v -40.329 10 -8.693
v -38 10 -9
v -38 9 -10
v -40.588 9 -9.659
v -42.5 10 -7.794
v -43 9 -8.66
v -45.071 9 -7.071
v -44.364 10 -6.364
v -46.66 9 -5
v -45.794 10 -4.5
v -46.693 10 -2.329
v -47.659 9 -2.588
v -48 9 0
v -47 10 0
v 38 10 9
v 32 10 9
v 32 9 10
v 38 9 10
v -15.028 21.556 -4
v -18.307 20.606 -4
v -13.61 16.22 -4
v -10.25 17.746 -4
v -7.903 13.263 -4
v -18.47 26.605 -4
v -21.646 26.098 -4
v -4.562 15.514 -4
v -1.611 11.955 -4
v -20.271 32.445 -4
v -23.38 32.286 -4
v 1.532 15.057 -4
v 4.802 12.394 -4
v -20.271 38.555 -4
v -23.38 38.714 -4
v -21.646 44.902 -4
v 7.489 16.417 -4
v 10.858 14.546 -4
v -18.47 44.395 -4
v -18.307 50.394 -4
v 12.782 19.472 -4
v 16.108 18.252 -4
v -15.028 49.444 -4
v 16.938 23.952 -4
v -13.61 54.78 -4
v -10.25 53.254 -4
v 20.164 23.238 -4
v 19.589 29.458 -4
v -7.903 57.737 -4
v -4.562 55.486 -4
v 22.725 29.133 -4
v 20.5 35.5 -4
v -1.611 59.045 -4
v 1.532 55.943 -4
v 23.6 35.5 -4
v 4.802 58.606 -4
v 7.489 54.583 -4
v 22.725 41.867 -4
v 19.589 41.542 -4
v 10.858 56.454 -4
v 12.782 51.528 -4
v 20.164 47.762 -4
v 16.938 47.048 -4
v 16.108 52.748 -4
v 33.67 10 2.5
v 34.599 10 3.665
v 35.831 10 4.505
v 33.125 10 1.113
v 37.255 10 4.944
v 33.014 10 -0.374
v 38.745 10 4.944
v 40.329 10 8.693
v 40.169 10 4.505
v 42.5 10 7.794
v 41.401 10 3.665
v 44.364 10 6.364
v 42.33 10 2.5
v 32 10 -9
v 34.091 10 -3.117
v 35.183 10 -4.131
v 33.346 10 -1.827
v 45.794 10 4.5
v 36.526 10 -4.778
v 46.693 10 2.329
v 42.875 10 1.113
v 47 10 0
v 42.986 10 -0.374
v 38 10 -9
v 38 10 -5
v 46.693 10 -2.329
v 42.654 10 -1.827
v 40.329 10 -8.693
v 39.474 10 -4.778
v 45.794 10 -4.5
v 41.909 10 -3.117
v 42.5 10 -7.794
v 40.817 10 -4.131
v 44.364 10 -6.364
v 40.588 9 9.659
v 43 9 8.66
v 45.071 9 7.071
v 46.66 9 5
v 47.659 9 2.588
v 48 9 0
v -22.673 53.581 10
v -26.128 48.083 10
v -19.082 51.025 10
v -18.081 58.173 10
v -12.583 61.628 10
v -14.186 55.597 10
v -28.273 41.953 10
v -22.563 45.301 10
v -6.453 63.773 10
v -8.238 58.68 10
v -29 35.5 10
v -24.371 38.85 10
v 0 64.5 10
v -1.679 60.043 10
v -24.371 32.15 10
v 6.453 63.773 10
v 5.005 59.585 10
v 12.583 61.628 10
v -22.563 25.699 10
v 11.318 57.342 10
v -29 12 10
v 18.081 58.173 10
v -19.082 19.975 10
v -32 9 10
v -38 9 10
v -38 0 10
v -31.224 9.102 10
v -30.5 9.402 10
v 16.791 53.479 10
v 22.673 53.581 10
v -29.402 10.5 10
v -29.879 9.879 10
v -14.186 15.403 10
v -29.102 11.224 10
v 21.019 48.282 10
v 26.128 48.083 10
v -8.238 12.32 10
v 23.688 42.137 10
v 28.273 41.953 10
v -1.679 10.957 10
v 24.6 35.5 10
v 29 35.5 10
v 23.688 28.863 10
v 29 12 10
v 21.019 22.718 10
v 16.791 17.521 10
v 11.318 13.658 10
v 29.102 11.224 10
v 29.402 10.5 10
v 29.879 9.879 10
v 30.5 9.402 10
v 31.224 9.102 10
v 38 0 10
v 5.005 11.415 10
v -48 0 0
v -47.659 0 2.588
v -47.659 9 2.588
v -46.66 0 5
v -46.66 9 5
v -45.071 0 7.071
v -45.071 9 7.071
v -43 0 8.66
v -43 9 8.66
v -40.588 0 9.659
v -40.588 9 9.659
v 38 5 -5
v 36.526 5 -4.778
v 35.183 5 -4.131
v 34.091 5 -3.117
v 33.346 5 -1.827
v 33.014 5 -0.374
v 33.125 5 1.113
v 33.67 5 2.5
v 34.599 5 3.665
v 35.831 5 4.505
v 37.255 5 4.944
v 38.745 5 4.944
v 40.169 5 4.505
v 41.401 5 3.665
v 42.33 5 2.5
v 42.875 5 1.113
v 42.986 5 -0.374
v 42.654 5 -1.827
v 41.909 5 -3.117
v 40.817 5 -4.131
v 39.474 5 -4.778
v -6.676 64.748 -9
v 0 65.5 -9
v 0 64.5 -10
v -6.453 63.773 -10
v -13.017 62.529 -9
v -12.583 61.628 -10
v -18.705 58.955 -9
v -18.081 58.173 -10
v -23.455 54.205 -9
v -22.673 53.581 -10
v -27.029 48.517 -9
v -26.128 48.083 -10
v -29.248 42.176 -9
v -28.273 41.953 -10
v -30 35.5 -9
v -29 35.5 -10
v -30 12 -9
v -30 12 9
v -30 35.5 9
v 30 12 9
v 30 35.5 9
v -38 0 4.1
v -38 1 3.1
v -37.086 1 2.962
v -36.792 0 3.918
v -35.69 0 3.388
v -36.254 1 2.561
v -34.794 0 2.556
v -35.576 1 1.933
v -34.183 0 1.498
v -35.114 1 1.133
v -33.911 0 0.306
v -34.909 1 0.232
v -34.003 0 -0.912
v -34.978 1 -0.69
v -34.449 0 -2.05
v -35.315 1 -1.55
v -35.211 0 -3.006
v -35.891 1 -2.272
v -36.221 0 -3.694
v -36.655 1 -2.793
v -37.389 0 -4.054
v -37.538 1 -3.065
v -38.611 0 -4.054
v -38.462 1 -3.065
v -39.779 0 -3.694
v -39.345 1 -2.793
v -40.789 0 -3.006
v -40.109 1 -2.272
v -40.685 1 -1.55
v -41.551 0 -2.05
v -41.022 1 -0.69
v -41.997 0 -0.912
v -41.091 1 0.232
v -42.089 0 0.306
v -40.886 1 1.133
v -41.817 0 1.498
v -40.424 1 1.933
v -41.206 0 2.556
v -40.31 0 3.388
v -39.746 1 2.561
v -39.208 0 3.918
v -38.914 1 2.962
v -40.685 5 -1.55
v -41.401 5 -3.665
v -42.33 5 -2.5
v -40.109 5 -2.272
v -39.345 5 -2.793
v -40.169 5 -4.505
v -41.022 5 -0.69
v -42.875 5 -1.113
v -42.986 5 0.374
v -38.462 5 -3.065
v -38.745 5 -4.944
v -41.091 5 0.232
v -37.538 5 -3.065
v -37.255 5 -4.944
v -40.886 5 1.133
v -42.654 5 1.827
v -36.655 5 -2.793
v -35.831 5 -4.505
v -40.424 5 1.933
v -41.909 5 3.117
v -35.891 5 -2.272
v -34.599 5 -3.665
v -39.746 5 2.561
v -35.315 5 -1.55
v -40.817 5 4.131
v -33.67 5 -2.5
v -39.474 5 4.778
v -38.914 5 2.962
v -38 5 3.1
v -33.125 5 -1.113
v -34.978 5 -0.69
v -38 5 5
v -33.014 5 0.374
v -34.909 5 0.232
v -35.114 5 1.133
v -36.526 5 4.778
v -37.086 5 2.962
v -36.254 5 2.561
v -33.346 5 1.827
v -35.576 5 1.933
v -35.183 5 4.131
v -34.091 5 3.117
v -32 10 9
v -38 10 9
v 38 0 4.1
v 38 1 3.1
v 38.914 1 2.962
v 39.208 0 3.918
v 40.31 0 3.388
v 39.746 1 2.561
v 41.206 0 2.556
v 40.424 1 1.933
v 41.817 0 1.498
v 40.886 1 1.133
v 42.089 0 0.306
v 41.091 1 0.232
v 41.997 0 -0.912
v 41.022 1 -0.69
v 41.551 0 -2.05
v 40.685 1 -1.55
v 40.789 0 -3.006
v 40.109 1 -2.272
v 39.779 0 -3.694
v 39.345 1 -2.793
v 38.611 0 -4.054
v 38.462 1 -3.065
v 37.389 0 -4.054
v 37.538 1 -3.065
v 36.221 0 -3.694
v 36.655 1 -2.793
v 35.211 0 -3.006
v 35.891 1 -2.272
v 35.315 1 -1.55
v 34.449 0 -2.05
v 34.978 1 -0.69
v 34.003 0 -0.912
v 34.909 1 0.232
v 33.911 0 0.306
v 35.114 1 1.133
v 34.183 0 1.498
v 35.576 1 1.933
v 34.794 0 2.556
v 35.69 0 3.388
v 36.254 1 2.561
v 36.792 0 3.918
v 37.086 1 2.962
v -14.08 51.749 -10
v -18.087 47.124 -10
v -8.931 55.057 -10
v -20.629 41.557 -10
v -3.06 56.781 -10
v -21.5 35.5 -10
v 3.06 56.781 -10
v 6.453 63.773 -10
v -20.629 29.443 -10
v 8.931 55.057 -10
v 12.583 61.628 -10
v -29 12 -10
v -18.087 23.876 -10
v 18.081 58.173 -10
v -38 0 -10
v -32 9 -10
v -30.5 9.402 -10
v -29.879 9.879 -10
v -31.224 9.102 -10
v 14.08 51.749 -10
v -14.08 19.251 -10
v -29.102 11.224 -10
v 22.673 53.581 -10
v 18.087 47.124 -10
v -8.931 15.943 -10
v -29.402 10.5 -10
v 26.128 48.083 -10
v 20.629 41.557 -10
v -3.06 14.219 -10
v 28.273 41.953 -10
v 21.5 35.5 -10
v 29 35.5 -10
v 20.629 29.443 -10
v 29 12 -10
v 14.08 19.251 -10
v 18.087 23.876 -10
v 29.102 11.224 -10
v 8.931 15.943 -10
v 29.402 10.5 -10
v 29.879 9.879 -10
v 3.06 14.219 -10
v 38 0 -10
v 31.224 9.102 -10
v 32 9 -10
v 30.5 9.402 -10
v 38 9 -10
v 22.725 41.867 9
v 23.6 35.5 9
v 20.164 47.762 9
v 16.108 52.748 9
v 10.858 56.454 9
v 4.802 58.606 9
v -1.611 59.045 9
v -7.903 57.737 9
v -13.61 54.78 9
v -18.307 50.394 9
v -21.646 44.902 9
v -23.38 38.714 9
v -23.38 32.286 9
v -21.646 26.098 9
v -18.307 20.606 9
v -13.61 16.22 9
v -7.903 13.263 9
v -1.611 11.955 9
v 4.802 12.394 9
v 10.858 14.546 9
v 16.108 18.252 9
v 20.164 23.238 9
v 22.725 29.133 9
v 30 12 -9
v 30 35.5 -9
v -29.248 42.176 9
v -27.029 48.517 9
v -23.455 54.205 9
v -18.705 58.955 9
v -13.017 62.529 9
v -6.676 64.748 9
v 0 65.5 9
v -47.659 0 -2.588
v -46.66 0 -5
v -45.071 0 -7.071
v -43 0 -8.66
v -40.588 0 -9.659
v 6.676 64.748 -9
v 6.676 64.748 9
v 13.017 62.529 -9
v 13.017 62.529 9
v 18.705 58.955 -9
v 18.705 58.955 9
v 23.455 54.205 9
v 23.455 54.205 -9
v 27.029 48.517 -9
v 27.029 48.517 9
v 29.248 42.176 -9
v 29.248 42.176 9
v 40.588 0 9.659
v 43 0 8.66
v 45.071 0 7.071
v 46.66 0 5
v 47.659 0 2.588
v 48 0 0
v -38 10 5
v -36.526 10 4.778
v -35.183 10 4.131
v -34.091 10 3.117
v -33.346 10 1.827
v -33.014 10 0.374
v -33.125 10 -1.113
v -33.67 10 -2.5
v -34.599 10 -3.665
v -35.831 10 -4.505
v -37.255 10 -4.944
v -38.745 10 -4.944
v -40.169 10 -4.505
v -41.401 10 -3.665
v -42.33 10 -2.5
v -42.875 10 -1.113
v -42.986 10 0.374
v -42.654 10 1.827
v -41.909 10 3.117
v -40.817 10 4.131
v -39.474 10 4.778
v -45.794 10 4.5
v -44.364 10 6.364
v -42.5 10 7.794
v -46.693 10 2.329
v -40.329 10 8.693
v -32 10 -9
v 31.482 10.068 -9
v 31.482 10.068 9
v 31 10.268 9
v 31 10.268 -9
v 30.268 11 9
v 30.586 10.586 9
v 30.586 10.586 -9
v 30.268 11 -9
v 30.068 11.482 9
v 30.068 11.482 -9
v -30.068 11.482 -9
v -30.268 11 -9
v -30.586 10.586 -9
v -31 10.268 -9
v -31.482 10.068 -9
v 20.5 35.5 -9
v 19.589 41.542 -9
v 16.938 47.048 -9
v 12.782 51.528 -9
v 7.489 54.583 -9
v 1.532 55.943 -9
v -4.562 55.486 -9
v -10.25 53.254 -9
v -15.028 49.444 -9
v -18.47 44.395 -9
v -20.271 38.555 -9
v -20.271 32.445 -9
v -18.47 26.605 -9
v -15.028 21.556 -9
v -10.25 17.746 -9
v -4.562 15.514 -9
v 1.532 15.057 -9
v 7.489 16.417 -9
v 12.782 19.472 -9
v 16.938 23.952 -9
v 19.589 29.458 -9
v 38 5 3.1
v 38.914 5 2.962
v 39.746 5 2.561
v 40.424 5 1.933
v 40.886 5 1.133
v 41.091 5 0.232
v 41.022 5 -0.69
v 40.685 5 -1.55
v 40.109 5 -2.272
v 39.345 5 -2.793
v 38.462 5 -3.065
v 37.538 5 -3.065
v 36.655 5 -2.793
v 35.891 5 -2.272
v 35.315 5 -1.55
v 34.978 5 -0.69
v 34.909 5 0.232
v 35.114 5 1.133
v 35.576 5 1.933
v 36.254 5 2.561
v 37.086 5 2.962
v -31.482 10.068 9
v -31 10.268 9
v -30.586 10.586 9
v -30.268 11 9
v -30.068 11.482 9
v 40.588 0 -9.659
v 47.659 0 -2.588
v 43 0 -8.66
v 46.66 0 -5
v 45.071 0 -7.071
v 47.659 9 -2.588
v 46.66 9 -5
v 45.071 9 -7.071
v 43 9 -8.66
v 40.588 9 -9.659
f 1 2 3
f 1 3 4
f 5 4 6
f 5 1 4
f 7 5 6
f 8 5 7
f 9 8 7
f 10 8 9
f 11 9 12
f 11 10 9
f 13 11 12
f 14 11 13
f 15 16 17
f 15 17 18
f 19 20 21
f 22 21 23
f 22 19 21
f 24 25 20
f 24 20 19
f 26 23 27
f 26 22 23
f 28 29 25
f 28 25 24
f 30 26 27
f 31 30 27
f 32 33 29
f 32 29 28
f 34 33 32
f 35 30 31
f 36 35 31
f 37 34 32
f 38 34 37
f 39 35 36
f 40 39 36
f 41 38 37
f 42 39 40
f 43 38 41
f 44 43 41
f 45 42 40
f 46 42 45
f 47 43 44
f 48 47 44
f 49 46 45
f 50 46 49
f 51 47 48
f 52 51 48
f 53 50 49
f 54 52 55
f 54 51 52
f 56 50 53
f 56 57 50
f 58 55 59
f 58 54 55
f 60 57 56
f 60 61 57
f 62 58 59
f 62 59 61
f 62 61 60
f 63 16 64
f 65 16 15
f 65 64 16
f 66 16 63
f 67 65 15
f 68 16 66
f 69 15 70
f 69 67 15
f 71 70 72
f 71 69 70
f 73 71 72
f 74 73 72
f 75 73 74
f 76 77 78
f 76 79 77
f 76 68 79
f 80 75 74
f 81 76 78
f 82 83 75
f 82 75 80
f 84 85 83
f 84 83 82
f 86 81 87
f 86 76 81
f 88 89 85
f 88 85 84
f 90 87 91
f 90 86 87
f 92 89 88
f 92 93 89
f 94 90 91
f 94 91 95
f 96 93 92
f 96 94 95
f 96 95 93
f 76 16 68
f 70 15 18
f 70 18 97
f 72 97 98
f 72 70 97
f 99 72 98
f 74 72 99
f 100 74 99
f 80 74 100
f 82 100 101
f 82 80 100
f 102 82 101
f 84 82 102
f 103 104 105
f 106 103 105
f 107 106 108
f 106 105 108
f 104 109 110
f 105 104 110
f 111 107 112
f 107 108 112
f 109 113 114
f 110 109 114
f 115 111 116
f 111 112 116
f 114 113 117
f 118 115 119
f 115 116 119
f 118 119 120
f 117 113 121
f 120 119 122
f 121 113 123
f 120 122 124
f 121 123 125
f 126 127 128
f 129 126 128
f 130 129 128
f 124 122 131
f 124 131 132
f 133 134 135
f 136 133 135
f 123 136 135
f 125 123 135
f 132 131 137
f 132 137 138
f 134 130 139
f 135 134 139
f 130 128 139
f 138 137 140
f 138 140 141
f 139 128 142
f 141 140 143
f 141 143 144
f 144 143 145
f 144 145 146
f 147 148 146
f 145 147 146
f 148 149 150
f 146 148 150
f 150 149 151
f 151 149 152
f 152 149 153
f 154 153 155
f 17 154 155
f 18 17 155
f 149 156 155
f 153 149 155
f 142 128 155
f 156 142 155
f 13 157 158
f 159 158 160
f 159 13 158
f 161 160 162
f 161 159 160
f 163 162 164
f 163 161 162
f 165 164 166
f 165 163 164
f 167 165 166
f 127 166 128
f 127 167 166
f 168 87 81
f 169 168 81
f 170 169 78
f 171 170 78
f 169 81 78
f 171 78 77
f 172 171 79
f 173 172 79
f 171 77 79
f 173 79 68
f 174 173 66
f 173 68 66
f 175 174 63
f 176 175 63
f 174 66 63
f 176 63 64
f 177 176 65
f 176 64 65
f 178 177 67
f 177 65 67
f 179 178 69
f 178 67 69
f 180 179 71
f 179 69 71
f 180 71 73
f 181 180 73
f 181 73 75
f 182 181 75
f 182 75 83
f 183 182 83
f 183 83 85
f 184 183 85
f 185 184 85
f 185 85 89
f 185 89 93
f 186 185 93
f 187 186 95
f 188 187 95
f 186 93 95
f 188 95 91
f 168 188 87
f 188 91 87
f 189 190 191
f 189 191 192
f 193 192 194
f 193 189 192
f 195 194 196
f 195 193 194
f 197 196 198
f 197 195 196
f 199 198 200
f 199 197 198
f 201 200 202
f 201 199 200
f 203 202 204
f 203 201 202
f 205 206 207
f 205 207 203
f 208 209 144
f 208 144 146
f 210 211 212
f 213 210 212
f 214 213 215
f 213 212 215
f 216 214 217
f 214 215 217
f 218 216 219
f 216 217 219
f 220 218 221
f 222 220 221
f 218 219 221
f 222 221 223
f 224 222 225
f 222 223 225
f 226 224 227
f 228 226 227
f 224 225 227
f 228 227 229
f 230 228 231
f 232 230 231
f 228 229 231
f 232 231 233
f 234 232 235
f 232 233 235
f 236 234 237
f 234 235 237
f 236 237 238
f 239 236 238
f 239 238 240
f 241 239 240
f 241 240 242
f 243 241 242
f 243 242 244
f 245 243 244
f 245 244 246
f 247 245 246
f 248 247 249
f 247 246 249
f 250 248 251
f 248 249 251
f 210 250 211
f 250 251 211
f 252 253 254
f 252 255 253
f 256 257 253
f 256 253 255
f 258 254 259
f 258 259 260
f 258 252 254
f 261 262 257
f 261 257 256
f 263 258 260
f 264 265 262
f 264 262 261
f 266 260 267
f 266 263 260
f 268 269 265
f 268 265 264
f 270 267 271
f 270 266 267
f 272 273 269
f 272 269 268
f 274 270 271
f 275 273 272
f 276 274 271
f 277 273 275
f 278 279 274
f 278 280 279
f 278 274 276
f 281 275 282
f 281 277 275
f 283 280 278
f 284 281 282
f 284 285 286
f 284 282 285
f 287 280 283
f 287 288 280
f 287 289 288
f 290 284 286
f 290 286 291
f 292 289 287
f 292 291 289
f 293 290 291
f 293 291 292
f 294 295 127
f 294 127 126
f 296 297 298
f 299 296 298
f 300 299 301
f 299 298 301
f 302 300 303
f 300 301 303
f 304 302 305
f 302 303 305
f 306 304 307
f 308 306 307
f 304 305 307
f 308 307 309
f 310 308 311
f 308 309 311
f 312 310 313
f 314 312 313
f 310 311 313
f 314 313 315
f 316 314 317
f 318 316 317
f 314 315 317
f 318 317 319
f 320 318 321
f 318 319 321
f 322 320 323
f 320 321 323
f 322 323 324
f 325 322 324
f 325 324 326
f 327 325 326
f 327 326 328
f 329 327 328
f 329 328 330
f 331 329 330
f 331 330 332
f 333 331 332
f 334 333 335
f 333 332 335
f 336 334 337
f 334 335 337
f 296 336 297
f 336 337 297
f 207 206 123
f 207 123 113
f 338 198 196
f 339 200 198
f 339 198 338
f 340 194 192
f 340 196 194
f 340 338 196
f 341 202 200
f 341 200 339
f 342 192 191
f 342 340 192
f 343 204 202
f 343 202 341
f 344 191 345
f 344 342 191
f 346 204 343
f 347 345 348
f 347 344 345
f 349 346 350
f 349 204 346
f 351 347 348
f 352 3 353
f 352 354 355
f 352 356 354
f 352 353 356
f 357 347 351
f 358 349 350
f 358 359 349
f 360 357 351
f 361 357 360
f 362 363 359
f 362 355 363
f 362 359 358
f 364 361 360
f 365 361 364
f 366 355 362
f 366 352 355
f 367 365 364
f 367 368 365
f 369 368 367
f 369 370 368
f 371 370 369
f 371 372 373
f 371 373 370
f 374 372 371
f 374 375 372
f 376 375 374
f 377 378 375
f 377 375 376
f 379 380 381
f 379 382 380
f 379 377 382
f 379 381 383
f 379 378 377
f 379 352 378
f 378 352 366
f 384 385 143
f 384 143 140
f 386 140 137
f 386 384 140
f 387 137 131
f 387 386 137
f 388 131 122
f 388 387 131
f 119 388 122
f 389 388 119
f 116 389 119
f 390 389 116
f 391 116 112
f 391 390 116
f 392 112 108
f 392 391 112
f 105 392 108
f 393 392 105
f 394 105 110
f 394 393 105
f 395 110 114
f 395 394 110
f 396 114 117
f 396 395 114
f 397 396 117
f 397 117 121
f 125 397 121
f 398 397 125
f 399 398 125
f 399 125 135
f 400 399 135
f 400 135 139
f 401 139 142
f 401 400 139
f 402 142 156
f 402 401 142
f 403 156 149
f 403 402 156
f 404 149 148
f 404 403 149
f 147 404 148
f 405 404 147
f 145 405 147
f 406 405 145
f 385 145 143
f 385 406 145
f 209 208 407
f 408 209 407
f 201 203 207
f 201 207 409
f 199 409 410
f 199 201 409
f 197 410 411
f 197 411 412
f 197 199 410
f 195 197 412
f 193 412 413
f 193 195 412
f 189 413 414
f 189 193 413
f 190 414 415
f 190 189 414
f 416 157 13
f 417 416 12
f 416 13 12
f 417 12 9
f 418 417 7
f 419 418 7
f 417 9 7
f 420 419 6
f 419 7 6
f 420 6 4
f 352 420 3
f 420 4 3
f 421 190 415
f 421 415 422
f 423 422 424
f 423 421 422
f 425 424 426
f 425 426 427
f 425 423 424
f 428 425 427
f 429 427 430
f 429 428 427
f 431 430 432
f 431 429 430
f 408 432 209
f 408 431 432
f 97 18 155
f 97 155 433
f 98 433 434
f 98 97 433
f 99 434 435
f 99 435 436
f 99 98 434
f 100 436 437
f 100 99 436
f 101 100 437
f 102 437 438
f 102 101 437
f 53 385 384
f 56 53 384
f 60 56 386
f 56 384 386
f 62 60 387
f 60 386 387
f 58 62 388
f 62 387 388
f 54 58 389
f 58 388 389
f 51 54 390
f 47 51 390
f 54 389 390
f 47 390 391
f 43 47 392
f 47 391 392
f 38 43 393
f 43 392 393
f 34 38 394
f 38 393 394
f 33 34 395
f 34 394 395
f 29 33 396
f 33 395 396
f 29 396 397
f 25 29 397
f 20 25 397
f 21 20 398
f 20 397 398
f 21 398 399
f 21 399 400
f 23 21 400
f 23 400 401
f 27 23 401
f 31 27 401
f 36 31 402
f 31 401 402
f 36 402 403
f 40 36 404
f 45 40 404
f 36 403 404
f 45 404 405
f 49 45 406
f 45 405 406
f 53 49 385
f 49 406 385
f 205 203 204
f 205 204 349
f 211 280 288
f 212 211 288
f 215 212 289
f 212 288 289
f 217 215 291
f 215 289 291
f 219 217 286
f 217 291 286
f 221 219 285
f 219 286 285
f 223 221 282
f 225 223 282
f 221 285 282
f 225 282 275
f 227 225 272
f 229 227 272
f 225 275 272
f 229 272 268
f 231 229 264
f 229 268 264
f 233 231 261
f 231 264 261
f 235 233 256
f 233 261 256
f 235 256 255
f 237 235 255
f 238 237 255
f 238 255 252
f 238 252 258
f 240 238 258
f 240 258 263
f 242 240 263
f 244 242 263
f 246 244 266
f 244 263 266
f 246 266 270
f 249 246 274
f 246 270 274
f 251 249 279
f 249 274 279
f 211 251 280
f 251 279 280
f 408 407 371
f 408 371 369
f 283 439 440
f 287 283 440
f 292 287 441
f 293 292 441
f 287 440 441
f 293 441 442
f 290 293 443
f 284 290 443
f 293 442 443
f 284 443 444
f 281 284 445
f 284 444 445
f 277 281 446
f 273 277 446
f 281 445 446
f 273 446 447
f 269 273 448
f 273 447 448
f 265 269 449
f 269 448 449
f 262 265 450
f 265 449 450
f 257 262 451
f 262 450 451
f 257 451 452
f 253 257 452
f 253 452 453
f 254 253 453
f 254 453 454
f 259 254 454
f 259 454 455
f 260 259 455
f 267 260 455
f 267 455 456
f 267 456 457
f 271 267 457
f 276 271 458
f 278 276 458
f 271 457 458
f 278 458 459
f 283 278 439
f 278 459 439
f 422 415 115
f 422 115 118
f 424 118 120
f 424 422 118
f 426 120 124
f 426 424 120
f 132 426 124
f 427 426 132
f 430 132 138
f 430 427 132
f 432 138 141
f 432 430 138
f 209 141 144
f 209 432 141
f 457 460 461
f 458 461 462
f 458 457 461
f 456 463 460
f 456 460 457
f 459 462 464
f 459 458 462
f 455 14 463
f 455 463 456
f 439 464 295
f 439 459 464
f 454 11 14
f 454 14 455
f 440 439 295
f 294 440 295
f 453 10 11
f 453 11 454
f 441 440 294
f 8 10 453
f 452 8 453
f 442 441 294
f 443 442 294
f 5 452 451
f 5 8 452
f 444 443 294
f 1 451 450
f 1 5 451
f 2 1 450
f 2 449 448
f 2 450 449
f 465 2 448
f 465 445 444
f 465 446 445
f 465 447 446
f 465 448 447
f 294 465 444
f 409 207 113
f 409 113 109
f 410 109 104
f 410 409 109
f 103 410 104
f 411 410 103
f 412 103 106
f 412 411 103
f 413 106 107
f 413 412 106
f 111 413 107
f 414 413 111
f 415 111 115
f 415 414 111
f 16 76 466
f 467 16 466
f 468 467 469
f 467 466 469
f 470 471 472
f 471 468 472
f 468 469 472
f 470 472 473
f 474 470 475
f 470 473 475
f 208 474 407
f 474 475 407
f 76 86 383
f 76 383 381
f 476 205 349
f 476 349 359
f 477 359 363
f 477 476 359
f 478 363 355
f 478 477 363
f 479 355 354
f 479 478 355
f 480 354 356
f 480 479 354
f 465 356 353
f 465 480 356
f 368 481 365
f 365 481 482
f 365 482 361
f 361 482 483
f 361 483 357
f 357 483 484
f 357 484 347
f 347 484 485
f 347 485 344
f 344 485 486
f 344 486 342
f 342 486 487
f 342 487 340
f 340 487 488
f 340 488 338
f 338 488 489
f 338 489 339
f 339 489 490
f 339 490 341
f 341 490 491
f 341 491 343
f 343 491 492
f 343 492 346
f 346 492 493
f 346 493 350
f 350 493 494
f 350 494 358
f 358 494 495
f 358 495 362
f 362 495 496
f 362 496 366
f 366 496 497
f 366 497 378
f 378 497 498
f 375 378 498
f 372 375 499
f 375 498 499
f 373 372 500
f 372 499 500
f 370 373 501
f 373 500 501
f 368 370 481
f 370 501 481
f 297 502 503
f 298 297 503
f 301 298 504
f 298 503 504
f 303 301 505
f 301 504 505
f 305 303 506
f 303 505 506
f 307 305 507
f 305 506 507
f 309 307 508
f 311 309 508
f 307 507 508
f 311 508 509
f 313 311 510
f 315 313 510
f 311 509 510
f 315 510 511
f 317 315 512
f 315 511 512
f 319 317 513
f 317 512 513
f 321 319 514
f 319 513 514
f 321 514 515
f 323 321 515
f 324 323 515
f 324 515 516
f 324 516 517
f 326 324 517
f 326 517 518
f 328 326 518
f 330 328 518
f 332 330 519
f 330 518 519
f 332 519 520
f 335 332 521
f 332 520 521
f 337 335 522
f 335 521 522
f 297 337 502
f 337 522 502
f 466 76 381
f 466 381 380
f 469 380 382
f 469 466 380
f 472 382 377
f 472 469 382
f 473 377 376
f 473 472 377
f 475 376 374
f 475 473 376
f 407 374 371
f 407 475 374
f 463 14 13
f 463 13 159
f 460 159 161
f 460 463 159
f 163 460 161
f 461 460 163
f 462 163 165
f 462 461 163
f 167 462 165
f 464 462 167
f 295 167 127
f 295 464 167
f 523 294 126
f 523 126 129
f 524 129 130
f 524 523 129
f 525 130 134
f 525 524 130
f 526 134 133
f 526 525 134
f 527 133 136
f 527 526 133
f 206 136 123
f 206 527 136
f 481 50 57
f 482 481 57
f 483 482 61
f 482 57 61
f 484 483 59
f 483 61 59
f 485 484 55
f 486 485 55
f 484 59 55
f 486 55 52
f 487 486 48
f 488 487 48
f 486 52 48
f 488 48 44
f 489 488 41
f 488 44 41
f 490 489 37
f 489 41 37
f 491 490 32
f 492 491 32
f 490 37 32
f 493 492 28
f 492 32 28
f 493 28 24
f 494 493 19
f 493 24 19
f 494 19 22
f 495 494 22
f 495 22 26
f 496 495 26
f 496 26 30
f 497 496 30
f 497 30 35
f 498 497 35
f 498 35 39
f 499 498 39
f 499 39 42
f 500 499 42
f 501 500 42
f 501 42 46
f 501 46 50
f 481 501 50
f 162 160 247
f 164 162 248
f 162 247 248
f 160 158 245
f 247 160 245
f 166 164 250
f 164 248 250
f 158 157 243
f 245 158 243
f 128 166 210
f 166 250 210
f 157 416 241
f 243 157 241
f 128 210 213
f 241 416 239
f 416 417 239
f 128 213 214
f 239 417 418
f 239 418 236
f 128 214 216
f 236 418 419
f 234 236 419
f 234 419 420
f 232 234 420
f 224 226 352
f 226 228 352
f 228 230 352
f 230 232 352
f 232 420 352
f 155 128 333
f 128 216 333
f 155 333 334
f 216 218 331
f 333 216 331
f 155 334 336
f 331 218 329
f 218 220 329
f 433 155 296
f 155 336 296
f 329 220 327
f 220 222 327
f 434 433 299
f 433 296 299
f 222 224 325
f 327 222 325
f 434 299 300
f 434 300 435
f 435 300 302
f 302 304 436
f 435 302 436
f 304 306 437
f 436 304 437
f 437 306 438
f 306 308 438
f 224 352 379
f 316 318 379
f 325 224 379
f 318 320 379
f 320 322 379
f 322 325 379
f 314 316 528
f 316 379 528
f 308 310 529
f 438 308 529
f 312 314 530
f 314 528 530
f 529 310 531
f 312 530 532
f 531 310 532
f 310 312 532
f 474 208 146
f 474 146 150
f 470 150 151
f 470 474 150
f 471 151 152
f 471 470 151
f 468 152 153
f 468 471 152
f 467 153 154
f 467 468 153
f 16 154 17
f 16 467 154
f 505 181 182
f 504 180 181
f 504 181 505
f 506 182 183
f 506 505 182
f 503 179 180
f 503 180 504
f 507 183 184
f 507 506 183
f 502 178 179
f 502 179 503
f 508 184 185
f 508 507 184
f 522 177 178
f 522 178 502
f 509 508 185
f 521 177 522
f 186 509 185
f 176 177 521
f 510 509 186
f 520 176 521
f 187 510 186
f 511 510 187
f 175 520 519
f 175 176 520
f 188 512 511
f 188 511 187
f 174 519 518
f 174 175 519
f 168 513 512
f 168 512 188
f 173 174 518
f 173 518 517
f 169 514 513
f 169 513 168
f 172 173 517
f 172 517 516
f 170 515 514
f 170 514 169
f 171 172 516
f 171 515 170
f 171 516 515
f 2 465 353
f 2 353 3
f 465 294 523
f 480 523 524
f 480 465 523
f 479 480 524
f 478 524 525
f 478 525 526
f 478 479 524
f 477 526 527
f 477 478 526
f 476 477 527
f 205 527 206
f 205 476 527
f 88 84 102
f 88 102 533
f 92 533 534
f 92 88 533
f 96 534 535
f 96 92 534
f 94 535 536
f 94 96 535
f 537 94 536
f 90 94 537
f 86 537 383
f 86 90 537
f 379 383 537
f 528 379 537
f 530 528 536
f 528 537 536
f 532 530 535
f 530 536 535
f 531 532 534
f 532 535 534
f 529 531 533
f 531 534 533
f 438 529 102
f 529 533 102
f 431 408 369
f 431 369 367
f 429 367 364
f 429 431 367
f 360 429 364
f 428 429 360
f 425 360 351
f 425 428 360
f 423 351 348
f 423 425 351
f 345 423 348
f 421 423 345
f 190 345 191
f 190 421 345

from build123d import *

# Parameters (mm, degrees)
SKETCH_1_W          = 96
SKETCH_1_H          = 20
EXTRUDE_1_DEPTH     = 10
SKETCH_2_R          = 5
CUT_EXTRUDE_1_DEPTH = 5
FILLET_1_R          = 10
SKETCH_3_R          = 3.1
CUT_EXTRUDE_2_DEPTH = 5
CHAMFER_1_SIZE      = 1
SKETCH_4_W          = 60
SKETCH_4_H          = 20
EXTRUDE_2_DEPTH     = 55.5
CUT_EXTRUDE_START   = -20
CUT_EXTRUDE_3_DEPTH = 20
SKETCH_6_4_R        = 23.6
CUT_EXTRUDE_4_DEPTH = 14
SKETCH_7_R          = 20.5
CUT_EXTRUDE_5_DEPTH = 10
FILLET_2_R          = 2
CHAMFER_2_SIZE      = 1
CHAMFER_3_SIZE      = 1


# Read off the part's stored shape, not the designer's step: 切除-拉伸3
with BuildPart() as part:
    # 草图1 → 凸台-拉伸1 (new body)
    with BuildSketch(Plane(origin=(0, 0, 0), x_dir=(1, 0, 0), z_dir=(0, 1, 0))):
        Rectangle(SKETCH_1_W, SKETCH_1_H)
    extrude(amount=EXTRUDE_1_DEPTH)

    # 草图2 → 切除-拉伸1 (cut)
    with BuildSketch(Plane(origin=(0, 10, 0), x_dir=(1, 0, 0), z_dir=(0, 1, 0))):
        with Locations(Location((-38, 0, 0), (0, 0, 270))):
            Circle(SKETCH_2_R)
        with Locations(Location((38, 0, 0), (0, 0, 90))):
            Circle(SKETCH_2_R)
    extrude(amount=-CUT_EXTRUDE_1_DEPTH, mode=Mode.SUBTRACT)

    # 圆角1
    fillet_1_edges = [part.edges().sort_by_distance(p)[0] for p in [
        (48, 5, -10),
        (48, 5, 10),
        (-48, 5, 10),
        (-48, 5, -10),
    ]]
    fillet(fillet_1_edges, radius=FILLET_1_R - 0.0001)  # a hair under: the kernel refuses the full size

    # 草图3 → 切除-拉伸2 (cut)
    with BuildSketch(Plane(origin=(0, 5, 0), x_dir=(1, 0, 0), z_dir=(0, 1, 0))):
        with Locations(Location((-38, 0, 0), (0, 0, 270))):
            Circle(SKETCH_3_R)
        with Locations(Location((38, 0, 0), (0, 0, 270))):
            Circle(SKETCH_3_R)
    extrude(amount=-CUT_EXTRUDE_2_DEPTH, mode=Mode.SUBTRACT)

    # 倒角1
    chamfer_1_edges = [part.edges().sort_by_distance(p)[0] for p in [
        (-38, 0, -3.1),
        (38, 0, -3.1),
    ]]
    chamfer(chamfer_1_edges, length=CHAMFER_1_SIZE)

    # 草图4 → 凸台-拉伸2 (add)
    with BuildSketch(Plane(origin=(0, 10, 0), x_dir=(1, 0, 0), z_dir=(0, 1, 0))):
        Rectangle(SKETCH_4_W, SKETCH_4_H)
    extrude(amount=EXTRUDE_2_DEPTH)

    # 切除-拉伸3 outline → 切除-拉伸3 (cut)
    with BuildSketch(Plane.XY.offset(10).offset(CUT_EXTRUDE_START)):
        with BuildLine():
            Line((-30, 65.5), (-30, 35.5))
            ThreePointArc((-30, 35.5), (-21.213203436, 56.713203436), (0, 65.5))
            Line((0, 65.5), (-30, 65.5))
        make_face()
        with BuildLine():
            Line((30, 65.5), (0, 65.5))
            ThreePointArc((0, 65.5), (21.213203436, 56.713203436), (30, 35.5))
            Line((30, 35.5), (30, 65.5))
        make_face()
    extrude(amount=CUT_EXTRUDE_3_DEPTH, mode=Mode.SUBTRACT)

    # 草图6<4> → 切除-拉伸4 (cut)
    with BuildSketch(Plane.XY.offset(10)):
        with Locations((0, 35.5)):
            Circle(SKETCH_6_4_R)
    extrude(amount=-CUT_EXTRUDE_4_DEPTH, mode=Mode.SUBTRACT)

    # 草图7 → 切除-拉伸5 (cut)
    with BuildSketch(Plane.XY.offset(-4)):
        with Locations((0, 35.5)):
            Circle(SKETCH_7_R)
    extrude(amount=-CUT_EXTRUDE_5_DEPTH, mode=Mode.SUBTRACT)

    # 圆角2
    fillet_2_edges = [part.edges().sort_by_distance(p)[0] for p in [
        (30, 10, 0),
        (-30, 10, 0),
    ]]
    fillet(fillet_2_edges, radius=FILLET_2_R)

    # 倒角2
    chamfer_2_edges = [part.edges().sort_by_distance(p)[0] for p in [
        (35.00005, 10, 10),
        (35.00005, 10, -10),
        (30.585786438, 10.585786438, -10),
        (30.585786438, 10.585786438, 10),
        (-30.585786438, 10.585786438, 10),
        (-30.585786438, 10.585786438, -10),
        (-35.00005, 10, -10),
        (-35.00005, 10, 10),
        (-45.071097101, 10, -7.071097101),
        (-45.071097101, 10, 7.071097101),
        (45.071097101, 10, 7.071097101),
        (45.071097101, 10, -7.071097101),
        (-30, 23.75, 10),
        (-30, 23.75, -10),
        (30, 23.75, -10),
        (30, 23.75, 10),
        (21.213203436, 56.713203436, -10),
        (-21.213203436, 56.713203436, 10),
    ]]
    chamfer(chamfer_2_edges, length=CHAMFER_2_SIZE)

    # 倒角3
    chamfer_3_edges = [part.edges().sort_by_distance(p)[0] for p in [
        (-20.5, 35.5, -10),
        (-23.6, 35.5, 10),
    ]]
    chamfer(chamfer_3_edges, length=CHAMFER_3_SIZE)


solid = part.part
